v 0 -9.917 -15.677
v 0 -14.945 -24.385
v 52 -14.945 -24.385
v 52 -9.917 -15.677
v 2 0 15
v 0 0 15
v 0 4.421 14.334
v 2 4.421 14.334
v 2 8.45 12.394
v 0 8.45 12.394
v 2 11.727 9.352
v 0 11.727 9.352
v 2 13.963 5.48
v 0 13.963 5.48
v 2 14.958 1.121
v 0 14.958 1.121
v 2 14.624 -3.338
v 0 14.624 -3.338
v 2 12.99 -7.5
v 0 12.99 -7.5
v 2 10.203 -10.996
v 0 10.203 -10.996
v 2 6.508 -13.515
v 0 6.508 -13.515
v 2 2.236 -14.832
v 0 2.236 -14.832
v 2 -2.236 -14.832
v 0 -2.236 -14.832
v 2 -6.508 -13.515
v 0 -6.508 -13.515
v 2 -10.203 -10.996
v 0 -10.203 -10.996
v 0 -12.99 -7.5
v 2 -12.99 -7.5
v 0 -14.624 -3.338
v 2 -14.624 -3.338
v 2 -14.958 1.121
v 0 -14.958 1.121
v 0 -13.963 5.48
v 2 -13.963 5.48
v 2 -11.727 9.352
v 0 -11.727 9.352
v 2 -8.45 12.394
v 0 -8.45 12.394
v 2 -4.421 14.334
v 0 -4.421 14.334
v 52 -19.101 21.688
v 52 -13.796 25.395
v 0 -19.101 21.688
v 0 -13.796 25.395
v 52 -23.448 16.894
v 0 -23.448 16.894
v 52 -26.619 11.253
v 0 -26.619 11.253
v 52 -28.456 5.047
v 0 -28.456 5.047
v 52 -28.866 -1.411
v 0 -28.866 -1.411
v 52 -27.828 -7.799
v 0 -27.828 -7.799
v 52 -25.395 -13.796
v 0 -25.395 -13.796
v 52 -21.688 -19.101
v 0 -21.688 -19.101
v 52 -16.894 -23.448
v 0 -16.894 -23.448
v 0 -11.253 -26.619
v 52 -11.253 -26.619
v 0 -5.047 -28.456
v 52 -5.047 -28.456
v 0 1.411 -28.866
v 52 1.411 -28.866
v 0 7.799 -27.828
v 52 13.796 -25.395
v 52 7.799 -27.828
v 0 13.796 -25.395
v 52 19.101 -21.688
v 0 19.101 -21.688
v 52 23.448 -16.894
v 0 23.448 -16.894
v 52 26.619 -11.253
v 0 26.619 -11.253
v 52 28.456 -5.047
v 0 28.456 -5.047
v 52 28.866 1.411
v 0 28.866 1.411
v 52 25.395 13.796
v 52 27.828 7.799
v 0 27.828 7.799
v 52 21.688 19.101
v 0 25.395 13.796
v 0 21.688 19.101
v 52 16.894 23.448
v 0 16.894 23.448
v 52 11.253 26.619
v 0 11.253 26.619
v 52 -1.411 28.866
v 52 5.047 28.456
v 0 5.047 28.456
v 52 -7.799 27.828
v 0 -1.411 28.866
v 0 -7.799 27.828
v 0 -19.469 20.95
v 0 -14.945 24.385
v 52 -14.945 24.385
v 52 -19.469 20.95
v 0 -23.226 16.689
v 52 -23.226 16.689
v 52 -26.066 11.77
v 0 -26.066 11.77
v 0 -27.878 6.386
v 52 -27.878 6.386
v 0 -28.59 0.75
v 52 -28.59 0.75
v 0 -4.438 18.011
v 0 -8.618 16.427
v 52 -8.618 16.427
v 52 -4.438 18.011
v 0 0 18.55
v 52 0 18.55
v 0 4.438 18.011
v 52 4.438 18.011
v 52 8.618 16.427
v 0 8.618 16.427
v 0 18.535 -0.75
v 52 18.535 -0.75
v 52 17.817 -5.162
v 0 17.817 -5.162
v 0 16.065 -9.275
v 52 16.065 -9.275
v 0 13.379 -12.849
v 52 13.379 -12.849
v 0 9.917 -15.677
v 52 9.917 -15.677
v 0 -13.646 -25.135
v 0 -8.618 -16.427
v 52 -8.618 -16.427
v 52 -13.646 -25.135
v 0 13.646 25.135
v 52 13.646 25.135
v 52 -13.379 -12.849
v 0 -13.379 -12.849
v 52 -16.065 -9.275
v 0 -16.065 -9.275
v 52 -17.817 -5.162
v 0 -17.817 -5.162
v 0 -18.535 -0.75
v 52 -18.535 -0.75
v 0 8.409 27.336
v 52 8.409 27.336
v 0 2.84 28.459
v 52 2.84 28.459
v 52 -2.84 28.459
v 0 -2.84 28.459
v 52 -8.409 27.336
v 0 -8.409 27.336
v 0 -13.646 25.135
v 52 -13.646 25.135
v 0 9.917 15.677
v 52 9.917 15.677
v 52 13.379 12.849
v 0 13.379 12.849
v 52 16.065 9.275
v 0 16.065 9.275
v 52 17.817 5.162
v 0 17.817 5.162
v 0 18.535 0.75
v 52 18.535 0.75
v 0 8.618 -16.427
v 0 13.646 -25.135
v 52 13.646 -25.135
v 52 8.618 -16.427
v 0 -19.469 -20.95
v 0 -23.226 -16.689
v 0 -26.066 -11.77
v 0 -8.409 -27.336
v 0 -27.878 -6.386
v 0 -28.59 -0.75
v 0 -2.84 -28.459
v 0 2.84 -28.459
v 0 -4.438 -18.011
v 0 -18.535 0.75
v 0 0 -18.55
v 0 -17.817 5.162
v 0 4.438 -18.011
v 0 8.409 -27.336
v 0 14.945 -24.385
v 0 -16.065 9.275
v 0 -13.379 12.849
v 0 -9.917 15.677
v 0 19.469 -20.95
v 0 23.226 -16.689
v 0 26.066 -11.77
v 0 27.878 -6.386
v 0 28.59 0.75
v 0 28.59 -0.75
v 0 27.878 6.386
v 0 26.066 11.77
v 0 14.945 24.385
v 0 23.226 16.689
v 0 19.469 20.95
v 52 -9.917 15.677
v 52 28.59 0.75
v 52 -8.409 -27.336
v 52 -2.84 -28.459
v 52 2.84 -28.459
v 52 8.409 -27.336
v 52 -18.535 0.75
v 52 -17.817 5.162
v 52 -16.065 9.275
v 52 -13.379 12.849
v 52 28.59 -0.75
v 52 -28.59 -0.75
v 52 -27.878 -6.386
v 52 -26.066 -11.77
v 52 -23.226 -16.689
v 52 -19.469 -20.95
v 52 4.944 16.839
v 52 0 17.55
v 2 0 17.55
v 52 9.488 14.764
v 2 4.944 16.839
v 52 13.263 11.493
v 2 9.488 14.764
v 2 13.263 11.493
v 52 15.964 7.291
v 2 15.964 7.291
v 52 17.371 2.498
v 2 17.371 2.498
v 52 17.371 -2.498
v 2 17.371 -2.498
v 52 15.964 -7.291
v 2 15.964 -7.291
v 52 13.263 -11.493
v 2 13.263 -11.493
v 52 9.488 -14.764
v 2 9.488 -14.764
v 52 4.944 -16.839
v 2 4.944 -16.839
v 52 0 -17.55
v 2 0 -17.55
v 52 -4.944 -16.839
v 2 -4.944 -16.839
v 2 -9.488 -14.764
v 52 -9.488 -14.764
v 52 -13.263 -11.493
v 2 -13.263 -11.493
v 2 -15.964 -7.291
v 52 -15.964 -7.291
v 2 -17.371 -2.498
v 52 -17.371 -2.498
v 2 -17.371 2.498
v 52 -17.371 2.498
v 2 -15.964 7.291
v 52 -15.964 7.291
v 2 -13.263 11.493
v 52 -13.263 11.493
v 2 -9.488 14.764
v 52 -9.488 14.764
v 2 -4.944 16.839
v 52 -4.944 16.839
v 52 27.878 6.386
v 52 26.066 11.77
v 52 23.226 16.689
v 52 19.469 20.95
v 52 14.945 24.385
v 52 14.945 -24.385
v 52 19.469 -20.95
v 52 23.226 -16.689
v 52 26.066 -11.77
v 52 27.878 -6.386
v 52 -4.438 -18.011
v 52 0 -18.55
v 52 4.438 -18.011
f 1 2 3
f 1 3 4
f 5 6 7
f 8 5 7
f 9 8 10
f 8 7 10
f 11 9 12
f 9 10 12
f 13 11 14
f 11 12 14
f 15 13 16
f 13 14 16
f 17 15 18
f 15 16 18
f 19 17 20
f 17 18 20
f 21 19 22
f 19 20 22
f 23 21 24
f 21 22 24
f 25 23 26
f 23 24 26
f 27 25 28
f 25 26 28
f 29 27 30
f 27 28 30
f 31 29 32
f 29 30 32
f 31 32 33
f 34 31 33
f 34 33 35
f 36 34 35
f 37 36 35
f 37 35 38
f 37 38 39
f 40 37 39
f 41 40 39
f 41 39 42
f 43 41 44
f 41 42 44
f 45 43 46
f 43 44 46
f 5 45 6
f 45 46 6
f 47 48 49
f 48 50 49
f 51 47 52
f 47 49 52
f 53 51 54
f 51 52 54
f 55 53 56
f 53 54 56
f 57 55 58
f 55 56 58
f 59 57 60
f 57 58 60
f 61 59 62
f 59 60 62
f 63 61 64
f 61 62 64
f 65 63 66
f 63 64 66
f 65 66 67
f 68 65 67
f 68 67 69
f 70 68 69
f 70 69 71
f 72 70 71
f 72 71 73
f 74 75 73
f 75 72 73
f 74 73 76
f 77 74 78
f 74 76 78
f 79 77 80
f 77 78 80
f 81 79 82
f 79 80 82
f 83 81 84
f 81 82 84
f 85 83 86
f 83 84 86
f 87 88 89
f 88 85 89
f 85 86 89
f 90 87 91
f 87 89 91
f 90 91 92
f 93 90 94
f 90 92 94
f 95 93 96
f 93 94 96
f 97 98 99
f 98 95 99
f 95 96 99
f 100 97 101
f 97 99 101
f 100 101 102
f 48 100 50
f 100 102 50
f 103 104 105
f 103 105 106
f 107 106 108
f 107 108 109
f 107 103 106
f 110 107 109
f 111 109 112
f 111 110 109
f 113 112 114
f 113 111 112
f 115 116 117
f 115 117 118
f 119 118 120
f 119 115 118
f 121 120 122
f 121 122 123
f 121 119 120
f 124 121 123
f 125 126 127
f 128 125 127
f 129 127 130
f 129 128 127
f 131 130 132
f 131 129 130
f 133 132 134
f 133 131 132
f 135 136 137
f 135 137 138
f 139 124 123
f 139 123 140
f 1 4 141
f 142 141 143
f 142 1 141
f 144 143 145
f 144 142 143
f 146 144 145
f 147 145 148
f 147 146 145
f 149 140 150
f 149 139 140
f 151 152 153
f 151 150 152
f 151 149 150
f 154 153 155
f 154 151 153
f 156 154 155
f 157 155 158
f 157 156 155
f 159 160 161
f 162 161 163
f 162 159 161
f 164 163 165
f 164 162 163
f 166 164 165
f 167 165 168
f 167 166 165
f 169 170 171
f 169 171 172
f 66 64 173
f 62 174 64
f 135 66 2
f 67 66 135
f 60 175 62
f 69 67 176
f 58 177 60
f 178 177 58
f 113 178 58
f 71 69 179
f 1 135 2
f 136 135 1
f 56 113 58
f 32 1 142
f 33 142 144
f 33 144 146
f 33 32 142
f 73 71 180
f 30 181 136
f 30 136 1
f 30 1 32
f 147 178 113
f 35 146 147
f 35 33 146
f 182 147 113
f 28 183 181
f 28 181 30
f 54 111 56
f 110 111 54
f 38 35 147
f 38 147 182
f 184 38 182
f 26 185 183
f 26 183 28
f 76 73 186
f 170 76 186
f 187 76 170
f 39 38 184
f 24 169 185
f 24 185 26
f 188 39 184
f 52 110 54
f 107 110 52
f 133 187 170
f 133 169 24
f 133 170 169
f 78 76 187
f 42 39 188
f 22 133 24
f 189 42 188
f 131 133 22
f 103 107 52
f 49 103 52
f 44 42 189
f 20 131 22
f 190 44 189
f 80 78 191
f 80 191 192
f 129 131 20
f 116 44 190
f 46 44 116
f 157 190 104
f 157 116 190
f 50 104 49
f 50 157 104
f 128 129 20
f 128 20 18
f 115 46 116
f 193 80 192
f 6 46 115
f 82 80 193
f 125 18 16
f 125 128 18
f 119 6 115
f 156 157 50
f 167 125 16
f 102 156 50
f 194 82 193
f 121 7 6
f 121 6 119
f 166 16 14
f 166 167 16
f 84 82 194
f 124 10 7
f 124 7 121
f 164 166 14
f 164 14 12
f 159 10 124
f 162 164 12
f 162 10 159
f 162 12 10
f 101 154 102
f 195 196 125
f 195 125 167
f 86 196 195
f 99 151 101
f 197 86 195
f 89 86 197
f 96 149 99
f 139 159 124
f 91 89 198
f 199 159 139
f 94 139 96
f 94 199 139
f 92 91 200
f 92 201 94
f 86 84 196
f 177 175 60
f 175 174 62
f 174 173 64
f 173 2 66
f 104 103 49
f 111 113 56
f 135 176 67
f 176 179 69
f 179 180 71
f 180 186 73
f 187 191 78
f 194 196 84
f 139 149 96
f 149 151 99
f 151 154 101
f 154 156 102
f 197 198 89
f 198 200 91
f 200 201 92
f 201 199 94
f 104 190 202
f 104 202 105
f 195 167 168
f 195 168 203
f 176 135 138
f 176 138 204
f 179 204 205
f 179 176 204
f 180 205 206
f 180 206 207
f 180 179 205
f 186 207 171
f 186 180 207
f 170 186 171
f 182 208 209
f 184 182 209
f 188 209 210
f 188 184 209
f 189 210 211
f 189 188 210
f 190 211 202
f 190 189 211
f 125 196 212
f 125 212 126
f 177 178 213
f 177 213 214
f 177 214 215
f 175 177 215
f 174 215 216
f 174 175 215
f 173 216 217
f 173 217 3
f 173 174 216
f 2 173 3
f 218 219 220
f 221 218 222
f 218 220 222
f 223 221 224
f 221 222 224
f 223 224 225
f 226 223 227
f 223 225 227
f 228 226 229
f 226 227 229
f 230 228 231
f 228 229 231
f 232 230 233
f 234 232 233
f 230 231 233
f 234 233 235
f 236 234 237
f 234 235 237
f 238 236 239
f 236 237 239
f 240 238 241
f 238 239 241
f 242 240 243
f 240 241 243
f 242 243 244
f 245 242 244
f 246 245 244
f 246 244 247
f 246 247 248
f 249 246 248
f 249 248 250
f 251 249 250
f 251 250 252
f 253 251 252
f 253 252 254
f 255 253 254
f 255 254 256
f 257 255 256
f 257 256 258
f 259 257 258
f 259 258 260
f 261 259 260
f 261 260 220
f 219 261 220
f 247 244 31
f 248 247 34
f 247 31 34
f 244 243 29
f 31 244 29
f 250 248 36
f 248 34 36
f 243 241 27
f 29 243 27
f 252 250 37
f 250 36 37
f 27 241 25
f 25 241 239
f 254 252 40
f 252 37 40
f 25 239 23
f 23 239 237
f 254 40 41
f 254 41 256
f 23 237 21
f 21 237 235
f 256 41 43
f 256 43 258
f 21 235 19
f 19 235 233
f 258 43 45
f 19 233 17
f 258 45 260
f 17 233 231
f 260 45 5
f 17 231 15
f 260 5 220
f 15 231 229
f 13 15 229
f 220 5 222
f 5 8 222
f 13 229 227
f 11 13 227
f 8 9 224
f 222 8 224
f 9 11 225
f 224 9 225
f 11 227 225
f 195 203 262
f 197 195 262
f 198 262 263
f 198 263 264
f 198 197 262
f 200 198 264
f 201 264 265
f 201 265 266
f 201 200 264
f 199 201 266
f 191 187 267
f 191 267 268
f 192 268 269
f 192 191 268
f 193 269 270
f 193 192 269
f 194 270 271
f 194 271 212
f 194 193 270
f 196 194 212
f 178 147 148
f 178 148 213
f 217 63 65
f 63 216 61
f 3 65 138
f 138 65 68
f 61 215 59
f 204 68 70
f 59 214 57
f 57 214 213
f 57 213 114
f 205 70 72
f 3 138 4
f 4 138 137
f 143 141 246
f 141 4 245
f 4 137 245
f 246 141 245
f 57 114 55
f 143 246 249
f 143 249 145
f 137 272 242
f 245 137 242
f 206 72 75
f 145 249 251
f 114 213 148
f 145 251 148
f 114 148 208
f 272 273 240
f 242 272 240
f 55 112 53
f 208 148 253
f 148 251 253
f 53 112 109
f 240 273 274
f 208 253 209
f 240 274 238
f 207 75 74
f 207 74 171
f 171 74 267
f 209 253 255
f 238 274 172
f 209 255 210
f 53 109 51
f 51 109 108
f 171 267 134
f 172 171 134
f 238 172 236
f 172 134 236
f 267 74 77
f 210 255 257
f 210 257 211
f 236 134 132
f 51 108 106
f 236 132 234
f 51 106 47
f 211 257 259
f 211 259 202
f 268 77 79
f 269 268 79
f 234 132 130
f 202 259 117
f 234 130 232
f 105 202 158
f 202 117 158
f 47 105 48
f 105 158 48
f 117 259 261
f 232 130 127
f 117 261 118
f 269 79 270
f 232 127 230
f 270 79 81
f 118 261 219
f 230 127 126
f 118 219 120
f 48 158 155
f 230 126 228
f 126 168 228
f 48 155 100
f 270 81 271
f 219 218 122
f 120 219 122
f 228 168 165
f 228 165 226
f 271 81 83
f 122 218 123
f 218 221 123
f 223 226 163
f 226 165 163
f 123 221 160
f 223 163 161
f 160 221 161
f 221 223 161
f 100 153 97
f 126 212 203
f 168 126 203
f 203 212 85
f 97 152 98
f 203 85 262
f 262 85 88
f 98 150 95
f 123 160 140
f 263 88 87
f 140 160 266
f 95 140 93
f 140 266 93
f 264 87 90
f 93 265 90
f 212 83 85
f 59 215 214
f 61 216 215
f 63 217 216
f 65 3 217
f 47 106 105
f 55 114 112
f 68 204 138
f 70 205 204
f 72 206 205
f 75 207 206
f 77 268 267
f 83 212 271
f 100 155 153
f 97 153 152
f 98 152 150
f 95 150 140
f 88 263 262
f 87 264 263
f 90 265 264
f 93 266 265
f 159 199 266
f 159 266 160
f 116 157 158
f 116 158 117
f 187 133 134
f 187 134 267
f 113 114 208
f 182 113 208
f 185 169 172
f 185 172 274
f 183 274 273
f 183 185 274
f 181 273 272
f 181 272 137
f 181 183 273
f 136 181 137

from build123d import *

# Parameters (mm, degrees)
CROQUIS1_R              = 28.9
CROQUIS1_R_2            = 28.6
SALIENTE_EXTRUIR1_DEPTH = 52
CROQUIS2_R              = 17.55
SALIENTE_EXTRUIR2_DEPTH = 52
CROQUIS3_R              = 17.55
CROQUIS3_R_2            = 15
SALIENTE_EXTRUIR3_DEPTH = 2
CROQUIS4_OUTSIDE_W      = 79.374
CROQUIS4_OUTSIDE_H      = 81.026
CROQUIS4_OUTSIDE_R      = 28.9
CORTAR_EXTRUIR1_DEPTH   = 100


with BuildPart() as part:
    # Croquis1 → Saliente-Extruir1 (new body)
    with BuildSketch(Plane(origin=(0, 0, 0), x_dir=(0, 0, -1), z_dir=(1, 0, 0))):
        with Locations(Location((0, 0, 0), (0, 0, 180))):
            Circle(CROQUIS1_R)
        with Locations(Location((0, 0, 0), (0, 0, 180))):
            Circle(CROQUIS1_R_2, mode=Mode.SUBTRACT)
    extrude(amount=SALIENTE_EXTRUIR1_DEPTH)

    # Croquis2 → Saliente-Extruir2 (add)
    with BuildSketch(Plane.ZY):
        with BuildLine():
            Line((-15.676635431, 9.91693509), (-25.360087572, 15.50767879))
            ThreePointArc((-25.360087572, 15.50767879), (-25.743282761, 14.862891232), (-26.110087572, 14.208640684))
            Line((-26.110087572, 14.208640684), (-16.426635431, 8.617896984))
            ThreePointArc((-16.426635431, 8.617896984), (-18.55, 0), (-16.426635431, -8.617896984))
            Line((-16.426635431, -8.617896984), (-26.110087572, -14.208640684))
            ThreePointArc((-26.110087572, -14.208640684), (-25.743282761, -14.862891232), (-25.360087572, -15.50767879))
            Line((-25.360087572, -15.50767879), (-15.676635431, -9.91693509))
            ThreePointArc((-15.676635431, -9.91693509), (-9.275, -16.06477124), (-0.75, -18.534832074))
            Line((-0.75, -18.534832074), (-0.75, -29.716319474))
            ThreePointArc((-0.75, -29.716319474), (0, -29.725782464), (0.75, -29.716319474))
            Line((0.75, -29.716319474), (0.75, -18.534832074))
            ThreePointArc((0.75, -18.534832074), (9.275, -16.06477124), (15.676635431, -9.91693509))
            Line((15.676635431, -9.91693509), (25.360087572, -15.50767879))
            ThreePointArc((25.360087572, -15.50767879), (25.743282761, -14.862891232), (26.110087572, -14.208640684))
            Line((26.110087572, -14.208640684), (16.426635431, -8.617896984))
            ThreePointArc((16.426635431, -8.617896984), (18.55, 0), (16.426635431, 8.617896984))
            Line((16.426635431, 8.617896984), (26.110087572, 14.208640684))
            ThreePointArc((26.110087572, 14.208640684), (25.743282761, 14.862891232), (25.360087572, 15.50767879))
            Line((25.360087572, 15.50767879), (15.676635431, 9.91693509))
            ThreePointArc((15.676635431, 9.91693509), (9.275, 16.06477124), (0.75, 18.534832074))
            Line((0.75, 18.534832074), (0.75, 29.716319474))
            ThreePointArc((0.75, 29.716319474), (0, 29.725782464), (-0.75, 29.716319474))
            Line((-0.75, 29.716319474), (-0.75, 18.534832074))
            ThreePointArc((-0.75, 18.534832074), (-9.275, 16.06477124), (-15.676635431, 9.91693509))
        make_face()
        Circle(CROQUIS2_R, mode=Mode.SUBTRACT)
    extrude(amount=-SALIENTE_EXTRUIR2_DEPTH)

    # Croquis3 → Saliente-Extruir3 (add)
    with BuildSketch(Plane.ZY):
        Circle(CROQUIS3_R)
        Circle(CROQUIS3_R_2, mode=Mode.SUBTRACT)
    extrude(amount=-SALIENTE_EXTRUIR3_DEPTH)

    # Croquis4 outside → Cortar-Extruir1 (cut)
    with BuildSketch(Plane(origin=(52, 0, 0), x_dir=(0, 0, -1), z_dir=(1, 0, 0))):
        Rectangle(CROQUIS4_OUTSIDE_W, CROQUIS4_OUTSIDE_H)
        with Locations(Location((0, 0, 0), (0, 0, 180))):
            Circle(CROQUIS4_OUTSIDE_R, mode=Mode.SUBTRACT)
    extrude(amount=-CORTAR_EXTRUIR1_DEPTH, mode=Mode.SUBTRACT)


solid = part.part
